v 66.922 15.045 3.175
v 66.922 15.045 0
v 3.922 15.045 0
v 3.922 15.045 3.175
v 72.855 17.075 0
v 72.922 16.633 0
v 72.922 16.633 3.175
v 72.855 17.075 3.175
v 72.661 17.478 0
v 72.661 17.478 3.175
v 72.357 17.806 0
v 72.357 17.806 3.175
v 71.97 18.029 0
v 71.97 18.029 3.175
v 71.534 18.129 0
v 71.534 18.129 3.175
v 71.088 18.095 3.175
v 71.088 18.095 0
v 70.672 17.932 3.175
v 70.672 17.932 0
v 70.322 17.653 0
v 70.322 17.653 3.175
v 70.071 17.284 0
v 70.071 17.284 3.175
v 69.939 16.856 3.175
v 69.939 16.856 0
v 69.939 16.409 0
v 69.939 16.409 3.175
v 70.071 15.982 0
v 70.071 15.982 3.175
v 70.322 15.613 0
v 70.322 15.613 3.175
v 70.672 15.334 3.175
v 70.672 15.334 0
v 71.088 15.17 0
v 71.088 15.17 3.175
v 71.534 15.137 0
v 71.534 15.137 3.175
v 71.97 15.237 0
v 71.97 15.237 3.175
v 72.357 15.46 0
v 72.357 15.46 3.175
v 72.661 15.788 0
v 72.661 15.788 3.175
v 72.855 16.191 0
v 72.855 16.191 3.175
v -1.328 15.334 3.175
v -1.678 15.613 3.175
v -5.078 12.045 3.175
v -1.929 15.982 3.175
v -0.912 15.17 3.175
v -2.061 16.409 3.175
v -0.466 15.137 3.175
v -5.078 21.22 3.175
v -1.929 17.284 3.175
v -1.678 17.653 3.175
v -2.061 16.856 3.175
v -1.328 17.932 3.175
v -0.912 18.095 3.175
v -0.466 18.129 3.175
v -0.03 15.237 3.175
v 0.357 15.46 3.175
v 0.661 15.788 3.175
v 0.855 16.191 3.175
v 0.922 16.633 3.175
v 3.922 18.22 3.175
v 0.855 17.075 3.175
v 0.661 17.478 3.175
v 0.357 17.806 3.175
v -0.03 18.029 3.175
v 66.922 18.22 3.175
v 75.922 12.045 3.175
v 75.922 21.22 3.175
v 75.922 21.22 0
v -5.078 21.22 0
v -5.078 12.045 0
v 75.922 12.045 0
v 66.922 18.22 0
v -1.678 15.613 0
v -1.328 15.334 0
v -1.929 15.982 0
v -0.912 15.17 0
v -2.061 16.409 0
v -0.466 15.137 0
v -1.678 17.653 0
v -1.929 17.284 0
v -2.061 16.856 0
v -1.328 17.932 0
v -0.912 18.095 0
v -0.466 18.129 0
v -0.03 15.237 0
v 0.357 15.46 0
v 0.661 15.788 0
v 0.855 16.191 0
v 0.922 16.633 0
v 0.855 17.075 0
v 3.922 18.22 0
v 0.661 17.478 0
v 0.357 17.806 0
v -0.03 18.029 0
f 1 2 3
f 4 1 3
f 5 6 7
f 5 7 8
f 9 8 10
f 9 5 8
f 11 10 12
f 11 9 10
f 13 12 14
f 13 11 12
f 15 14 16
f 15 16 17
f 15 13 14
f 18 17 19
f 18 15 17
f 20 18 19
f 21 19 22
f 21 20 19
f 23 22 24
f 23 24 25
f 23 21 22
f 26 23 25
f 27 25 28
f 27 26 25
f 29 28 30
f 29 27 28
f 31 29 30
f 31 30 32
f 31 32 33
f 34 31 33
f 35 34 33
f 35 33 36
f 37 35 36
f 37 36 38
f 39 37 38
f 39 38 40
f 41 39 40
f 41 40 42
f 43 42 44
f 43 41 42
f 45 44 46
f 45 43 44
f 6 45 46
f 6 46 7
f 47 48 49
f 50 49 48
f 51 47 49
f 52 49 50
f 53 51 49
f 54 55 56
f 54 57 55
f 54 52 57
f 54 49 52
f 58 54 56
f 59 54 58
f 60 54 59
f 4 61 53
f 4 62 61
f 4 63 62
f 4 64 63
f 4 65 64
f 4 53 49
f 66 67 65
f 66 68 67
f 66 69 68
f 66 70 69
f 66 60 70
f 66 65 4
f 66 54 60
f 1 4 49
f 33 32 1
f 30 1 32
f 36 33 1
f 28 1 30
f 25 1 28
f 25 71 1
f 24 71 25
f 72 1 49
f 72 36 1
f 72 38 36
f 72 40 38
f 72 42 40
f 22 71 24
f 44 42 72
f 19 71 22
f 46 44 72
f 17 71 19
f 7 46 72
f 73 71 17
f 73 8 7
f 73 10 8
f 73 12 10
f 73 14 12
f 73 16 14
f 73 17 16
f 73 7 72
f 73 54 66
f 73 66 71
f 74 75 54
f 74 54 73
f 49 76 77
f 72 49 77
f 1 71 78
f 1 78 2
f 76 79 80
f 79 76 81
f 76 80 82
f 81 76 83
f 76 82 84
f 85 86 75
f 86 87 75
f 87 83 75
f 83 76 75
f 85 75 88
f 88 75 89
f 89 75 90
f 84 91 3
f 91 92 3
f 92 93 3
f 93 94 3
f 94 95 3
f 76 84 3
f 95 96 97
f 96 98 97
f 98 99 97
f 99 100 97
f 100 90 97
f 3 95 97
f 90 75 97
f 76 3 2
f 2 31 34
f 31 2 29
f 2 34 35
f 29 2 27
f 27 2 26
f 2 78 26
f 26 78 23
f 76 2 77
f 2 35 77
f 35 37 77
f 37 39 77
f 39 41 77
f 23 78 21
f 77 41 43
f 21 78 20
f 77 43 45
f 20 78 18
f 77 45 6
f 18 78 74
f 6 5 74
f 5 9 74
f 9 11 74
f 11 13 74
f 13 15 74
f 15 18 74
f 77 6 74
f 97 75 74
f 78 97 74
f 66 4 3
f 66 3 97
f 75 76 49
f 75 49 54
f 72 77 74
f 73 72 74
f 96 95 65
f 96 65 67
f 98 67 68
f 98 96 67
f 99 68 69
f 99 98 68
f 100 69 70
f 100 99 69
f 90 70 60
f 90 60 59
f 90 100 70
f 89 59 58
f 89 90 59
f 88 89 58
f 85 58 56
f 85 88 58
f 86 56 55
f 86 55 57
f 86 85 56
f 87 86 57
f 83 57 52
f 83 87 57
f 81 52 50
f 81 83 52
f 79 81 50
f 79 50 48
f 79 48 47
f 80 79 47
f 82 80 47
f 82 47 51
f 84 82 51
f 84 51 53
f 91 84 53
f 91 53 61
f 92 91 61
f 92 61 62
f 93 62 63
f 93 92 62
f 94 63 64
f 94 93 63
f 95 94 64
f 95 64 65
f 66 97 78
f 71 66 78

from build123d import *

# Parameters (mm, degrees)
F0_W     = 81
F0_H     = 9.175
F0_R     = 1.5
F1_DEPTH = 3.175


# Not quite as in the source:
# - a length typed as a fraction of an inch, garbled in the dataset ("3 / 203.2 mm" for 3/8 in), is restored


with BuildPart() as f1:
    # F0 (on Top) → F1 (new body)
    with BuildSketch(Plane.XY):
        with Locations((35.4220271409, 16.632870598)):
            Rectangle(F0_W, F0_H)
        with Locations((-0.5779728591, 16.632870598)):
            Circle(F0_R, mode=Mode.SUBTRACT)
        Polygon((3.9220271409, 15.045370598), (3.9220271409, 18.220370598), (35.4220271409, 18.220370598), (66.9220271409, 18.220370598), (66.9220271409, 15.045370598), align=None, mode=Mode.SUBTRACT)
        with Locations((71.4220271409, 16.632870598)):
            Circle(F0_R, mode=Mode.SUBTRACT)
    extrude(amount=F1_DEPTH)


solid = f1.part
